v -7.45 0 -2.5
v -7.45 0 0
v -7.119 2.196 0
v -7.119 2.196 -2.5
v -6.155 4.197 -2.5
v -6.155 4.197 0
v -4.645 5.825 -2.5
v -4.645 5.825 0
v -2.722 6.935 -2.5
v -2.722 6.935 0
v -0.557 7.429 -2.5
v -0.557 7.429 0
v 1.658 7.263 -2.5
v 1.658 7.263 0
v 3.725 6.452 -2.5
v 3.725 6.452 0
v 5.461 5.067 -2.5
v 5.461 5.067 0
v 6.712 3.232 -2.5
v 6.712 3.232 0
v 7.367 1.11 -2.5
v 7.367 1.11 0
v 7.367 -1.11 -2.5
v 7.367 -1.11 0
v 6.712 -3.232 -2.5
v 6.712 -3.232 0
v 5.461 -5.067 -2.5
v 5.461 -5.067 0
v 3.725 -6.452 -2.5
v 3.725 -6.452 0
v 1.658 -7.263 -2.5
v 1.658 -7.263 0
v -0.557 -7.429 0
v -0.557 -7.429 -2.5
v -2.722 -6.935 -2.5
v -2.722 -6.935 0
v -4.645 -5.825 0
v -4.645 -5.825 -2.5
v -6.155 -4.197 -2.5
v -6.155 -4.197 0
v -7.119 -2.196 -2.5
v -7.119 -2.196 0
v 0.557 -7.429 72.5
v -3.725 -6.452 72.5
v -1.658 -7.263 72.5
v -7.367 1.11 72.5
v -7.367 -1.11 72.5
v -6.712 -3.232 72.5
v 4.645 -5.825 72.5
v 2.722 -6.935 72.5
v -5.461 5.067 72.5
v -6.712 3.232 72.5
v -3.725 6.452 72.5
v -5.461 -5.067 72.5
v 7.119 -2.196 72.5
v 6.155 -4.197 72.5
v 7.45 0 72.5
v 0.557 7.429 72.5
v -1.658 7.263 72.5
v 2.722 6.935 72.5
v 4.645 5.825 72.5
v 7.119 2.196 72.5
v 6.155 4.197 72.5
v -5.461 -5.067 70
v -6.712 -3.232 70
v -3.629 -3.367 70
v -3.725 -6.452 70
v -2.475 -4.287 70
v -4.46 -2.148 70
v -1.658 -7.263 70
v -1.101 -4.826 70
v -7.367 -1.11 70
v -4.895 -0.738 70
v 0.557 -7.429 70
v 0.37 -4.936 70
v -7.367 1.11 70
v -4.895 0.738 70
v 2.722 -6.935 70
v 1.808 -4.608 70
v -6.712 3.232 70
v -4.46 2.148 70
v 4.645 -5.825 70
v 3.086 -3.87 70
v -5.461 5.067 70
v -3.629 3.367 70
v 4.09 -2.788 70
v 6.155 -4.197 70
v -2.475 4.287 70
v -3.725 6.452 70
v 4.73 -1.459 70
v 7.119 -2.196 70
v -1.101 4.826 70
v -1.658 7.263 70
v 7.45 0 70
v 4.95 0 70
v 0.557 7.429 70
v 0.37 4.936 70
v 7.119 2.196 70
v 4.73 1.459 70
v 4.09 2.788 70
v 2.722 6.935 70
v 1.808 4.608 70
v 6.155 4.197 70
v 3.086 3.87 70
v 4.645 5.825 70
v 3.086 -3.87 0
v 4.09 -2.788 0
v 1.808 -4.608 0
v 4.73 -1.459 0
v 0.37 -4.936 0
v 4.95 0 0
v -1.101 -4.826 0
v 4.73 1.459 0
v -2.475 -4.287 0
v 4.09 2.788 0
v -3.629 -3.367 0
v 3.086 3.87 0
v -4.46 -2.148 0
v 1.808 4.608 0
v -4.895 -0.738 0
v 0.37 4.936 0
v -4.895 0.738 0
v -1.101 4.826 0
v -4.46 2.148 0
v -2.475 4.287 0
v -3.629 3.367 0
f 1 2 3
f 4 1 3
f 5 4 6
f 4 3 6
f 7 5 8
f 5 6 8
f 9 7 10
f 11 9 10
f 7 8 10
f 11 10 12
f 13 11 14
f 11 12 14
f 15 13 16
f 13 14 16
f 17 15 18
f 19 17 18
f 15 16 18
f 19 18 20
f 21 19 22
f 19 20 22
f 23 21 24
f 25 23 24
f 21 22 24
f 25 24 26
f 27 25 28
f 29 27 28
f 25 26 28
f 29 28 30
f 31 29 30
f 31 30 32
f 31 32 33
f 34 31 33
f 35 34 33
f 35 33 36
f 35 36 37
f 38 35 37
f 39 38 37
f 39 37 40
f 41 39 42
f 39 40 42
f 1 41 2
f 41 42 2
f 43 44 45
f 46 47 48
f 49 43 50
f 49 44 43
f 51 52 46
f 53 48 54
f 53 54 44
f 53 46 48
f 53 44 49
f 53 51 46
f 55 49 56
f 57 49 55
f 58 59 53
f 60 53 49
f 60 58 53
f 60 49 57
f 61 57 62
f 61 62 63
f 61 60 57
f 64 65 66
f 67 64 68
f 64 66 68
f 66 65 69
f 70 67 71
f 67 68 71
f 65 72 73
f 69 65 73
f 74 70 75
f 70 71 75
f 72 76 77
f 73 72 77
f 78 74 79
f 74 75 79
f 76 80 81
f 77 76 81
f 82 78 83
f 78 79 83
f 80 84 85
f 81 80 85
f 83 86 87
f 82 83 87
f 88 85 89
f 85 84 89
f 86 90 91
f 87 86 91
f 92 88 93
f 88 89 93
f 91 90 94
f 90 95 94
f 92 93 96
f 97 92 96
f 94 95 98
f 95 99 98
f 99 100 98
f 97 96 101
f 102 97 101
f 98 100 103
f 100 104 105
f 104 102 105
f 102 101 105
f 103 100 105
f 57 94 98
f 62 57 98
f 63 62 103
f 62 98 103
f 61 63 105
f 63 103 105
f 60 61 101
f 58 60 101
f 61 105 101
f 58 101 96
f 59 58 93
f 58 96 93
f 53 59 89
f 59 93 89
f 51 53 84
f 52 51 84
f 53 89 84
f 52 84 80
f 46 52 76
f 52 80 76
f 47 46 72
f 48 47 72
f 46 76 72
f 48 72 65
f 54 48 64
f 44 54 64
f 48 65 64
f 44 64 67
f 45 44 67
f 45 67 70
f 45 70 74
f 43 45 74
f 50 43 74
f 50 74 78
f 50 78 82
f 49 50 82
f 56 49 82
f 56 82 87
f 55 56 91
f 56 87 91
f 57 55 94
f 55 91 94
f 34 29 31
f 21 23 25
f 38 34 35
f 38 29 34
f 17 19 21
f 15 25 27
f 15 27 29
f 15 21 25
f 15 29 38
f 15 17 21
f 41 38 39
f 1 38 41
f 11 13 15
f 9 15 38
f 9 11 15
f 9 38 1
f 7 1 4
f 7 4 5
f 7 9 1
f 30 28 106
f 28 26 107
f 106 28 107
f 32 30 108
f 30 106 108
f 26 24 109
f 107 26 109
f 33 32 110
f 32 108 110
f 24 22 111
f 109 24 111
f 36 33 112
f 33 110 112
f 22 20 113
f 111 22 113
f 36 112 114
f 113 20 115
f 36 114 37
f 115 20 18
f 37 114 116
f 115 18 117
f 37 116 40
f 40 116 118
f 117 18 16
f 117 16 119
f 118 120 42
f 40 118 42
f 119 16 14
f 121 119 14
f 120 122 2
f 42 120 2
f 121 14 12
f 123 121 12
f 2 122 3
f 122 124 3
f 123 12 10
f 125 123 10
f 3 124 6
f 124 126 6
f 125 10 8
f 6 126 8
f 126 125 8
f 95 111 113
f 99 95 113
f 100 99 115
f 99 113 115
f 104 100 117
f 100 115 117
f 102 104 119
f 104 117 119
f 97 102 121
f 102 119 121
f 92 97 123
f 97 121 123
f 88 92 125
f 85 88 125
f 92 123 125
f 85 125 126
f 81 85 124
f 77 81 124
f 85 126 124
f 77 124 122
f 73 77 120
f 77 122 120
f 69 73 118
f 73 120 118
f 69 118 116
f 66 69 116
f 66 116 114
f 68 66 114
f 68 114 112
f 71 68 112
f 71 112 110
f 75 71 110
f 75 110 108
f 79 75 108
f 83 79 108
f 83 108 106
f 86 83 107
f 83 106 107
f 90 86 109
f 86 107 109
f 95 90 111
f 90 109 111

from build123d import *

# Parameters (mm, degrees)
SKETCH1_R           = 4.95
BOSS_EXTRUDE1_DEPTH = 70
SKETCH2_R           = 7.45
BOSS_EXTRUDE2_DEPTH = 2.5
SKETCH3_R           = 7.45
BOSS_EXTRUDE3_DEPTH = 2.5


with BuildPart() as part:
    # Sketch1 → Boss-Extrude1 (new body)
    with BuildSketch(Plane.XY):
        Circle(SKETCH1_R)
    extrude(amount=BOSS_EXTRUDE1_DEPTH)

    # Sketch2 → Boss-Extrude2 (add)
    with BuildSketch(Plane(origin=(0, 0, 0), x_dir=(-1, 0, 0), z_dir=(0, 0, -1))):
        Circle(SKETCH2_R)
    extrude(amount=BOSS_EXTRUDE2_DEPTH)

    # Sketch3 → Boss-Extrude3 (add)
    with BuildSketch(Plane.XY.offset(70)):
        Circle(SKETCH3_R)
    extrude(amount=BOSS_EXTRUDE3_DEPTH)


solid = part.part
